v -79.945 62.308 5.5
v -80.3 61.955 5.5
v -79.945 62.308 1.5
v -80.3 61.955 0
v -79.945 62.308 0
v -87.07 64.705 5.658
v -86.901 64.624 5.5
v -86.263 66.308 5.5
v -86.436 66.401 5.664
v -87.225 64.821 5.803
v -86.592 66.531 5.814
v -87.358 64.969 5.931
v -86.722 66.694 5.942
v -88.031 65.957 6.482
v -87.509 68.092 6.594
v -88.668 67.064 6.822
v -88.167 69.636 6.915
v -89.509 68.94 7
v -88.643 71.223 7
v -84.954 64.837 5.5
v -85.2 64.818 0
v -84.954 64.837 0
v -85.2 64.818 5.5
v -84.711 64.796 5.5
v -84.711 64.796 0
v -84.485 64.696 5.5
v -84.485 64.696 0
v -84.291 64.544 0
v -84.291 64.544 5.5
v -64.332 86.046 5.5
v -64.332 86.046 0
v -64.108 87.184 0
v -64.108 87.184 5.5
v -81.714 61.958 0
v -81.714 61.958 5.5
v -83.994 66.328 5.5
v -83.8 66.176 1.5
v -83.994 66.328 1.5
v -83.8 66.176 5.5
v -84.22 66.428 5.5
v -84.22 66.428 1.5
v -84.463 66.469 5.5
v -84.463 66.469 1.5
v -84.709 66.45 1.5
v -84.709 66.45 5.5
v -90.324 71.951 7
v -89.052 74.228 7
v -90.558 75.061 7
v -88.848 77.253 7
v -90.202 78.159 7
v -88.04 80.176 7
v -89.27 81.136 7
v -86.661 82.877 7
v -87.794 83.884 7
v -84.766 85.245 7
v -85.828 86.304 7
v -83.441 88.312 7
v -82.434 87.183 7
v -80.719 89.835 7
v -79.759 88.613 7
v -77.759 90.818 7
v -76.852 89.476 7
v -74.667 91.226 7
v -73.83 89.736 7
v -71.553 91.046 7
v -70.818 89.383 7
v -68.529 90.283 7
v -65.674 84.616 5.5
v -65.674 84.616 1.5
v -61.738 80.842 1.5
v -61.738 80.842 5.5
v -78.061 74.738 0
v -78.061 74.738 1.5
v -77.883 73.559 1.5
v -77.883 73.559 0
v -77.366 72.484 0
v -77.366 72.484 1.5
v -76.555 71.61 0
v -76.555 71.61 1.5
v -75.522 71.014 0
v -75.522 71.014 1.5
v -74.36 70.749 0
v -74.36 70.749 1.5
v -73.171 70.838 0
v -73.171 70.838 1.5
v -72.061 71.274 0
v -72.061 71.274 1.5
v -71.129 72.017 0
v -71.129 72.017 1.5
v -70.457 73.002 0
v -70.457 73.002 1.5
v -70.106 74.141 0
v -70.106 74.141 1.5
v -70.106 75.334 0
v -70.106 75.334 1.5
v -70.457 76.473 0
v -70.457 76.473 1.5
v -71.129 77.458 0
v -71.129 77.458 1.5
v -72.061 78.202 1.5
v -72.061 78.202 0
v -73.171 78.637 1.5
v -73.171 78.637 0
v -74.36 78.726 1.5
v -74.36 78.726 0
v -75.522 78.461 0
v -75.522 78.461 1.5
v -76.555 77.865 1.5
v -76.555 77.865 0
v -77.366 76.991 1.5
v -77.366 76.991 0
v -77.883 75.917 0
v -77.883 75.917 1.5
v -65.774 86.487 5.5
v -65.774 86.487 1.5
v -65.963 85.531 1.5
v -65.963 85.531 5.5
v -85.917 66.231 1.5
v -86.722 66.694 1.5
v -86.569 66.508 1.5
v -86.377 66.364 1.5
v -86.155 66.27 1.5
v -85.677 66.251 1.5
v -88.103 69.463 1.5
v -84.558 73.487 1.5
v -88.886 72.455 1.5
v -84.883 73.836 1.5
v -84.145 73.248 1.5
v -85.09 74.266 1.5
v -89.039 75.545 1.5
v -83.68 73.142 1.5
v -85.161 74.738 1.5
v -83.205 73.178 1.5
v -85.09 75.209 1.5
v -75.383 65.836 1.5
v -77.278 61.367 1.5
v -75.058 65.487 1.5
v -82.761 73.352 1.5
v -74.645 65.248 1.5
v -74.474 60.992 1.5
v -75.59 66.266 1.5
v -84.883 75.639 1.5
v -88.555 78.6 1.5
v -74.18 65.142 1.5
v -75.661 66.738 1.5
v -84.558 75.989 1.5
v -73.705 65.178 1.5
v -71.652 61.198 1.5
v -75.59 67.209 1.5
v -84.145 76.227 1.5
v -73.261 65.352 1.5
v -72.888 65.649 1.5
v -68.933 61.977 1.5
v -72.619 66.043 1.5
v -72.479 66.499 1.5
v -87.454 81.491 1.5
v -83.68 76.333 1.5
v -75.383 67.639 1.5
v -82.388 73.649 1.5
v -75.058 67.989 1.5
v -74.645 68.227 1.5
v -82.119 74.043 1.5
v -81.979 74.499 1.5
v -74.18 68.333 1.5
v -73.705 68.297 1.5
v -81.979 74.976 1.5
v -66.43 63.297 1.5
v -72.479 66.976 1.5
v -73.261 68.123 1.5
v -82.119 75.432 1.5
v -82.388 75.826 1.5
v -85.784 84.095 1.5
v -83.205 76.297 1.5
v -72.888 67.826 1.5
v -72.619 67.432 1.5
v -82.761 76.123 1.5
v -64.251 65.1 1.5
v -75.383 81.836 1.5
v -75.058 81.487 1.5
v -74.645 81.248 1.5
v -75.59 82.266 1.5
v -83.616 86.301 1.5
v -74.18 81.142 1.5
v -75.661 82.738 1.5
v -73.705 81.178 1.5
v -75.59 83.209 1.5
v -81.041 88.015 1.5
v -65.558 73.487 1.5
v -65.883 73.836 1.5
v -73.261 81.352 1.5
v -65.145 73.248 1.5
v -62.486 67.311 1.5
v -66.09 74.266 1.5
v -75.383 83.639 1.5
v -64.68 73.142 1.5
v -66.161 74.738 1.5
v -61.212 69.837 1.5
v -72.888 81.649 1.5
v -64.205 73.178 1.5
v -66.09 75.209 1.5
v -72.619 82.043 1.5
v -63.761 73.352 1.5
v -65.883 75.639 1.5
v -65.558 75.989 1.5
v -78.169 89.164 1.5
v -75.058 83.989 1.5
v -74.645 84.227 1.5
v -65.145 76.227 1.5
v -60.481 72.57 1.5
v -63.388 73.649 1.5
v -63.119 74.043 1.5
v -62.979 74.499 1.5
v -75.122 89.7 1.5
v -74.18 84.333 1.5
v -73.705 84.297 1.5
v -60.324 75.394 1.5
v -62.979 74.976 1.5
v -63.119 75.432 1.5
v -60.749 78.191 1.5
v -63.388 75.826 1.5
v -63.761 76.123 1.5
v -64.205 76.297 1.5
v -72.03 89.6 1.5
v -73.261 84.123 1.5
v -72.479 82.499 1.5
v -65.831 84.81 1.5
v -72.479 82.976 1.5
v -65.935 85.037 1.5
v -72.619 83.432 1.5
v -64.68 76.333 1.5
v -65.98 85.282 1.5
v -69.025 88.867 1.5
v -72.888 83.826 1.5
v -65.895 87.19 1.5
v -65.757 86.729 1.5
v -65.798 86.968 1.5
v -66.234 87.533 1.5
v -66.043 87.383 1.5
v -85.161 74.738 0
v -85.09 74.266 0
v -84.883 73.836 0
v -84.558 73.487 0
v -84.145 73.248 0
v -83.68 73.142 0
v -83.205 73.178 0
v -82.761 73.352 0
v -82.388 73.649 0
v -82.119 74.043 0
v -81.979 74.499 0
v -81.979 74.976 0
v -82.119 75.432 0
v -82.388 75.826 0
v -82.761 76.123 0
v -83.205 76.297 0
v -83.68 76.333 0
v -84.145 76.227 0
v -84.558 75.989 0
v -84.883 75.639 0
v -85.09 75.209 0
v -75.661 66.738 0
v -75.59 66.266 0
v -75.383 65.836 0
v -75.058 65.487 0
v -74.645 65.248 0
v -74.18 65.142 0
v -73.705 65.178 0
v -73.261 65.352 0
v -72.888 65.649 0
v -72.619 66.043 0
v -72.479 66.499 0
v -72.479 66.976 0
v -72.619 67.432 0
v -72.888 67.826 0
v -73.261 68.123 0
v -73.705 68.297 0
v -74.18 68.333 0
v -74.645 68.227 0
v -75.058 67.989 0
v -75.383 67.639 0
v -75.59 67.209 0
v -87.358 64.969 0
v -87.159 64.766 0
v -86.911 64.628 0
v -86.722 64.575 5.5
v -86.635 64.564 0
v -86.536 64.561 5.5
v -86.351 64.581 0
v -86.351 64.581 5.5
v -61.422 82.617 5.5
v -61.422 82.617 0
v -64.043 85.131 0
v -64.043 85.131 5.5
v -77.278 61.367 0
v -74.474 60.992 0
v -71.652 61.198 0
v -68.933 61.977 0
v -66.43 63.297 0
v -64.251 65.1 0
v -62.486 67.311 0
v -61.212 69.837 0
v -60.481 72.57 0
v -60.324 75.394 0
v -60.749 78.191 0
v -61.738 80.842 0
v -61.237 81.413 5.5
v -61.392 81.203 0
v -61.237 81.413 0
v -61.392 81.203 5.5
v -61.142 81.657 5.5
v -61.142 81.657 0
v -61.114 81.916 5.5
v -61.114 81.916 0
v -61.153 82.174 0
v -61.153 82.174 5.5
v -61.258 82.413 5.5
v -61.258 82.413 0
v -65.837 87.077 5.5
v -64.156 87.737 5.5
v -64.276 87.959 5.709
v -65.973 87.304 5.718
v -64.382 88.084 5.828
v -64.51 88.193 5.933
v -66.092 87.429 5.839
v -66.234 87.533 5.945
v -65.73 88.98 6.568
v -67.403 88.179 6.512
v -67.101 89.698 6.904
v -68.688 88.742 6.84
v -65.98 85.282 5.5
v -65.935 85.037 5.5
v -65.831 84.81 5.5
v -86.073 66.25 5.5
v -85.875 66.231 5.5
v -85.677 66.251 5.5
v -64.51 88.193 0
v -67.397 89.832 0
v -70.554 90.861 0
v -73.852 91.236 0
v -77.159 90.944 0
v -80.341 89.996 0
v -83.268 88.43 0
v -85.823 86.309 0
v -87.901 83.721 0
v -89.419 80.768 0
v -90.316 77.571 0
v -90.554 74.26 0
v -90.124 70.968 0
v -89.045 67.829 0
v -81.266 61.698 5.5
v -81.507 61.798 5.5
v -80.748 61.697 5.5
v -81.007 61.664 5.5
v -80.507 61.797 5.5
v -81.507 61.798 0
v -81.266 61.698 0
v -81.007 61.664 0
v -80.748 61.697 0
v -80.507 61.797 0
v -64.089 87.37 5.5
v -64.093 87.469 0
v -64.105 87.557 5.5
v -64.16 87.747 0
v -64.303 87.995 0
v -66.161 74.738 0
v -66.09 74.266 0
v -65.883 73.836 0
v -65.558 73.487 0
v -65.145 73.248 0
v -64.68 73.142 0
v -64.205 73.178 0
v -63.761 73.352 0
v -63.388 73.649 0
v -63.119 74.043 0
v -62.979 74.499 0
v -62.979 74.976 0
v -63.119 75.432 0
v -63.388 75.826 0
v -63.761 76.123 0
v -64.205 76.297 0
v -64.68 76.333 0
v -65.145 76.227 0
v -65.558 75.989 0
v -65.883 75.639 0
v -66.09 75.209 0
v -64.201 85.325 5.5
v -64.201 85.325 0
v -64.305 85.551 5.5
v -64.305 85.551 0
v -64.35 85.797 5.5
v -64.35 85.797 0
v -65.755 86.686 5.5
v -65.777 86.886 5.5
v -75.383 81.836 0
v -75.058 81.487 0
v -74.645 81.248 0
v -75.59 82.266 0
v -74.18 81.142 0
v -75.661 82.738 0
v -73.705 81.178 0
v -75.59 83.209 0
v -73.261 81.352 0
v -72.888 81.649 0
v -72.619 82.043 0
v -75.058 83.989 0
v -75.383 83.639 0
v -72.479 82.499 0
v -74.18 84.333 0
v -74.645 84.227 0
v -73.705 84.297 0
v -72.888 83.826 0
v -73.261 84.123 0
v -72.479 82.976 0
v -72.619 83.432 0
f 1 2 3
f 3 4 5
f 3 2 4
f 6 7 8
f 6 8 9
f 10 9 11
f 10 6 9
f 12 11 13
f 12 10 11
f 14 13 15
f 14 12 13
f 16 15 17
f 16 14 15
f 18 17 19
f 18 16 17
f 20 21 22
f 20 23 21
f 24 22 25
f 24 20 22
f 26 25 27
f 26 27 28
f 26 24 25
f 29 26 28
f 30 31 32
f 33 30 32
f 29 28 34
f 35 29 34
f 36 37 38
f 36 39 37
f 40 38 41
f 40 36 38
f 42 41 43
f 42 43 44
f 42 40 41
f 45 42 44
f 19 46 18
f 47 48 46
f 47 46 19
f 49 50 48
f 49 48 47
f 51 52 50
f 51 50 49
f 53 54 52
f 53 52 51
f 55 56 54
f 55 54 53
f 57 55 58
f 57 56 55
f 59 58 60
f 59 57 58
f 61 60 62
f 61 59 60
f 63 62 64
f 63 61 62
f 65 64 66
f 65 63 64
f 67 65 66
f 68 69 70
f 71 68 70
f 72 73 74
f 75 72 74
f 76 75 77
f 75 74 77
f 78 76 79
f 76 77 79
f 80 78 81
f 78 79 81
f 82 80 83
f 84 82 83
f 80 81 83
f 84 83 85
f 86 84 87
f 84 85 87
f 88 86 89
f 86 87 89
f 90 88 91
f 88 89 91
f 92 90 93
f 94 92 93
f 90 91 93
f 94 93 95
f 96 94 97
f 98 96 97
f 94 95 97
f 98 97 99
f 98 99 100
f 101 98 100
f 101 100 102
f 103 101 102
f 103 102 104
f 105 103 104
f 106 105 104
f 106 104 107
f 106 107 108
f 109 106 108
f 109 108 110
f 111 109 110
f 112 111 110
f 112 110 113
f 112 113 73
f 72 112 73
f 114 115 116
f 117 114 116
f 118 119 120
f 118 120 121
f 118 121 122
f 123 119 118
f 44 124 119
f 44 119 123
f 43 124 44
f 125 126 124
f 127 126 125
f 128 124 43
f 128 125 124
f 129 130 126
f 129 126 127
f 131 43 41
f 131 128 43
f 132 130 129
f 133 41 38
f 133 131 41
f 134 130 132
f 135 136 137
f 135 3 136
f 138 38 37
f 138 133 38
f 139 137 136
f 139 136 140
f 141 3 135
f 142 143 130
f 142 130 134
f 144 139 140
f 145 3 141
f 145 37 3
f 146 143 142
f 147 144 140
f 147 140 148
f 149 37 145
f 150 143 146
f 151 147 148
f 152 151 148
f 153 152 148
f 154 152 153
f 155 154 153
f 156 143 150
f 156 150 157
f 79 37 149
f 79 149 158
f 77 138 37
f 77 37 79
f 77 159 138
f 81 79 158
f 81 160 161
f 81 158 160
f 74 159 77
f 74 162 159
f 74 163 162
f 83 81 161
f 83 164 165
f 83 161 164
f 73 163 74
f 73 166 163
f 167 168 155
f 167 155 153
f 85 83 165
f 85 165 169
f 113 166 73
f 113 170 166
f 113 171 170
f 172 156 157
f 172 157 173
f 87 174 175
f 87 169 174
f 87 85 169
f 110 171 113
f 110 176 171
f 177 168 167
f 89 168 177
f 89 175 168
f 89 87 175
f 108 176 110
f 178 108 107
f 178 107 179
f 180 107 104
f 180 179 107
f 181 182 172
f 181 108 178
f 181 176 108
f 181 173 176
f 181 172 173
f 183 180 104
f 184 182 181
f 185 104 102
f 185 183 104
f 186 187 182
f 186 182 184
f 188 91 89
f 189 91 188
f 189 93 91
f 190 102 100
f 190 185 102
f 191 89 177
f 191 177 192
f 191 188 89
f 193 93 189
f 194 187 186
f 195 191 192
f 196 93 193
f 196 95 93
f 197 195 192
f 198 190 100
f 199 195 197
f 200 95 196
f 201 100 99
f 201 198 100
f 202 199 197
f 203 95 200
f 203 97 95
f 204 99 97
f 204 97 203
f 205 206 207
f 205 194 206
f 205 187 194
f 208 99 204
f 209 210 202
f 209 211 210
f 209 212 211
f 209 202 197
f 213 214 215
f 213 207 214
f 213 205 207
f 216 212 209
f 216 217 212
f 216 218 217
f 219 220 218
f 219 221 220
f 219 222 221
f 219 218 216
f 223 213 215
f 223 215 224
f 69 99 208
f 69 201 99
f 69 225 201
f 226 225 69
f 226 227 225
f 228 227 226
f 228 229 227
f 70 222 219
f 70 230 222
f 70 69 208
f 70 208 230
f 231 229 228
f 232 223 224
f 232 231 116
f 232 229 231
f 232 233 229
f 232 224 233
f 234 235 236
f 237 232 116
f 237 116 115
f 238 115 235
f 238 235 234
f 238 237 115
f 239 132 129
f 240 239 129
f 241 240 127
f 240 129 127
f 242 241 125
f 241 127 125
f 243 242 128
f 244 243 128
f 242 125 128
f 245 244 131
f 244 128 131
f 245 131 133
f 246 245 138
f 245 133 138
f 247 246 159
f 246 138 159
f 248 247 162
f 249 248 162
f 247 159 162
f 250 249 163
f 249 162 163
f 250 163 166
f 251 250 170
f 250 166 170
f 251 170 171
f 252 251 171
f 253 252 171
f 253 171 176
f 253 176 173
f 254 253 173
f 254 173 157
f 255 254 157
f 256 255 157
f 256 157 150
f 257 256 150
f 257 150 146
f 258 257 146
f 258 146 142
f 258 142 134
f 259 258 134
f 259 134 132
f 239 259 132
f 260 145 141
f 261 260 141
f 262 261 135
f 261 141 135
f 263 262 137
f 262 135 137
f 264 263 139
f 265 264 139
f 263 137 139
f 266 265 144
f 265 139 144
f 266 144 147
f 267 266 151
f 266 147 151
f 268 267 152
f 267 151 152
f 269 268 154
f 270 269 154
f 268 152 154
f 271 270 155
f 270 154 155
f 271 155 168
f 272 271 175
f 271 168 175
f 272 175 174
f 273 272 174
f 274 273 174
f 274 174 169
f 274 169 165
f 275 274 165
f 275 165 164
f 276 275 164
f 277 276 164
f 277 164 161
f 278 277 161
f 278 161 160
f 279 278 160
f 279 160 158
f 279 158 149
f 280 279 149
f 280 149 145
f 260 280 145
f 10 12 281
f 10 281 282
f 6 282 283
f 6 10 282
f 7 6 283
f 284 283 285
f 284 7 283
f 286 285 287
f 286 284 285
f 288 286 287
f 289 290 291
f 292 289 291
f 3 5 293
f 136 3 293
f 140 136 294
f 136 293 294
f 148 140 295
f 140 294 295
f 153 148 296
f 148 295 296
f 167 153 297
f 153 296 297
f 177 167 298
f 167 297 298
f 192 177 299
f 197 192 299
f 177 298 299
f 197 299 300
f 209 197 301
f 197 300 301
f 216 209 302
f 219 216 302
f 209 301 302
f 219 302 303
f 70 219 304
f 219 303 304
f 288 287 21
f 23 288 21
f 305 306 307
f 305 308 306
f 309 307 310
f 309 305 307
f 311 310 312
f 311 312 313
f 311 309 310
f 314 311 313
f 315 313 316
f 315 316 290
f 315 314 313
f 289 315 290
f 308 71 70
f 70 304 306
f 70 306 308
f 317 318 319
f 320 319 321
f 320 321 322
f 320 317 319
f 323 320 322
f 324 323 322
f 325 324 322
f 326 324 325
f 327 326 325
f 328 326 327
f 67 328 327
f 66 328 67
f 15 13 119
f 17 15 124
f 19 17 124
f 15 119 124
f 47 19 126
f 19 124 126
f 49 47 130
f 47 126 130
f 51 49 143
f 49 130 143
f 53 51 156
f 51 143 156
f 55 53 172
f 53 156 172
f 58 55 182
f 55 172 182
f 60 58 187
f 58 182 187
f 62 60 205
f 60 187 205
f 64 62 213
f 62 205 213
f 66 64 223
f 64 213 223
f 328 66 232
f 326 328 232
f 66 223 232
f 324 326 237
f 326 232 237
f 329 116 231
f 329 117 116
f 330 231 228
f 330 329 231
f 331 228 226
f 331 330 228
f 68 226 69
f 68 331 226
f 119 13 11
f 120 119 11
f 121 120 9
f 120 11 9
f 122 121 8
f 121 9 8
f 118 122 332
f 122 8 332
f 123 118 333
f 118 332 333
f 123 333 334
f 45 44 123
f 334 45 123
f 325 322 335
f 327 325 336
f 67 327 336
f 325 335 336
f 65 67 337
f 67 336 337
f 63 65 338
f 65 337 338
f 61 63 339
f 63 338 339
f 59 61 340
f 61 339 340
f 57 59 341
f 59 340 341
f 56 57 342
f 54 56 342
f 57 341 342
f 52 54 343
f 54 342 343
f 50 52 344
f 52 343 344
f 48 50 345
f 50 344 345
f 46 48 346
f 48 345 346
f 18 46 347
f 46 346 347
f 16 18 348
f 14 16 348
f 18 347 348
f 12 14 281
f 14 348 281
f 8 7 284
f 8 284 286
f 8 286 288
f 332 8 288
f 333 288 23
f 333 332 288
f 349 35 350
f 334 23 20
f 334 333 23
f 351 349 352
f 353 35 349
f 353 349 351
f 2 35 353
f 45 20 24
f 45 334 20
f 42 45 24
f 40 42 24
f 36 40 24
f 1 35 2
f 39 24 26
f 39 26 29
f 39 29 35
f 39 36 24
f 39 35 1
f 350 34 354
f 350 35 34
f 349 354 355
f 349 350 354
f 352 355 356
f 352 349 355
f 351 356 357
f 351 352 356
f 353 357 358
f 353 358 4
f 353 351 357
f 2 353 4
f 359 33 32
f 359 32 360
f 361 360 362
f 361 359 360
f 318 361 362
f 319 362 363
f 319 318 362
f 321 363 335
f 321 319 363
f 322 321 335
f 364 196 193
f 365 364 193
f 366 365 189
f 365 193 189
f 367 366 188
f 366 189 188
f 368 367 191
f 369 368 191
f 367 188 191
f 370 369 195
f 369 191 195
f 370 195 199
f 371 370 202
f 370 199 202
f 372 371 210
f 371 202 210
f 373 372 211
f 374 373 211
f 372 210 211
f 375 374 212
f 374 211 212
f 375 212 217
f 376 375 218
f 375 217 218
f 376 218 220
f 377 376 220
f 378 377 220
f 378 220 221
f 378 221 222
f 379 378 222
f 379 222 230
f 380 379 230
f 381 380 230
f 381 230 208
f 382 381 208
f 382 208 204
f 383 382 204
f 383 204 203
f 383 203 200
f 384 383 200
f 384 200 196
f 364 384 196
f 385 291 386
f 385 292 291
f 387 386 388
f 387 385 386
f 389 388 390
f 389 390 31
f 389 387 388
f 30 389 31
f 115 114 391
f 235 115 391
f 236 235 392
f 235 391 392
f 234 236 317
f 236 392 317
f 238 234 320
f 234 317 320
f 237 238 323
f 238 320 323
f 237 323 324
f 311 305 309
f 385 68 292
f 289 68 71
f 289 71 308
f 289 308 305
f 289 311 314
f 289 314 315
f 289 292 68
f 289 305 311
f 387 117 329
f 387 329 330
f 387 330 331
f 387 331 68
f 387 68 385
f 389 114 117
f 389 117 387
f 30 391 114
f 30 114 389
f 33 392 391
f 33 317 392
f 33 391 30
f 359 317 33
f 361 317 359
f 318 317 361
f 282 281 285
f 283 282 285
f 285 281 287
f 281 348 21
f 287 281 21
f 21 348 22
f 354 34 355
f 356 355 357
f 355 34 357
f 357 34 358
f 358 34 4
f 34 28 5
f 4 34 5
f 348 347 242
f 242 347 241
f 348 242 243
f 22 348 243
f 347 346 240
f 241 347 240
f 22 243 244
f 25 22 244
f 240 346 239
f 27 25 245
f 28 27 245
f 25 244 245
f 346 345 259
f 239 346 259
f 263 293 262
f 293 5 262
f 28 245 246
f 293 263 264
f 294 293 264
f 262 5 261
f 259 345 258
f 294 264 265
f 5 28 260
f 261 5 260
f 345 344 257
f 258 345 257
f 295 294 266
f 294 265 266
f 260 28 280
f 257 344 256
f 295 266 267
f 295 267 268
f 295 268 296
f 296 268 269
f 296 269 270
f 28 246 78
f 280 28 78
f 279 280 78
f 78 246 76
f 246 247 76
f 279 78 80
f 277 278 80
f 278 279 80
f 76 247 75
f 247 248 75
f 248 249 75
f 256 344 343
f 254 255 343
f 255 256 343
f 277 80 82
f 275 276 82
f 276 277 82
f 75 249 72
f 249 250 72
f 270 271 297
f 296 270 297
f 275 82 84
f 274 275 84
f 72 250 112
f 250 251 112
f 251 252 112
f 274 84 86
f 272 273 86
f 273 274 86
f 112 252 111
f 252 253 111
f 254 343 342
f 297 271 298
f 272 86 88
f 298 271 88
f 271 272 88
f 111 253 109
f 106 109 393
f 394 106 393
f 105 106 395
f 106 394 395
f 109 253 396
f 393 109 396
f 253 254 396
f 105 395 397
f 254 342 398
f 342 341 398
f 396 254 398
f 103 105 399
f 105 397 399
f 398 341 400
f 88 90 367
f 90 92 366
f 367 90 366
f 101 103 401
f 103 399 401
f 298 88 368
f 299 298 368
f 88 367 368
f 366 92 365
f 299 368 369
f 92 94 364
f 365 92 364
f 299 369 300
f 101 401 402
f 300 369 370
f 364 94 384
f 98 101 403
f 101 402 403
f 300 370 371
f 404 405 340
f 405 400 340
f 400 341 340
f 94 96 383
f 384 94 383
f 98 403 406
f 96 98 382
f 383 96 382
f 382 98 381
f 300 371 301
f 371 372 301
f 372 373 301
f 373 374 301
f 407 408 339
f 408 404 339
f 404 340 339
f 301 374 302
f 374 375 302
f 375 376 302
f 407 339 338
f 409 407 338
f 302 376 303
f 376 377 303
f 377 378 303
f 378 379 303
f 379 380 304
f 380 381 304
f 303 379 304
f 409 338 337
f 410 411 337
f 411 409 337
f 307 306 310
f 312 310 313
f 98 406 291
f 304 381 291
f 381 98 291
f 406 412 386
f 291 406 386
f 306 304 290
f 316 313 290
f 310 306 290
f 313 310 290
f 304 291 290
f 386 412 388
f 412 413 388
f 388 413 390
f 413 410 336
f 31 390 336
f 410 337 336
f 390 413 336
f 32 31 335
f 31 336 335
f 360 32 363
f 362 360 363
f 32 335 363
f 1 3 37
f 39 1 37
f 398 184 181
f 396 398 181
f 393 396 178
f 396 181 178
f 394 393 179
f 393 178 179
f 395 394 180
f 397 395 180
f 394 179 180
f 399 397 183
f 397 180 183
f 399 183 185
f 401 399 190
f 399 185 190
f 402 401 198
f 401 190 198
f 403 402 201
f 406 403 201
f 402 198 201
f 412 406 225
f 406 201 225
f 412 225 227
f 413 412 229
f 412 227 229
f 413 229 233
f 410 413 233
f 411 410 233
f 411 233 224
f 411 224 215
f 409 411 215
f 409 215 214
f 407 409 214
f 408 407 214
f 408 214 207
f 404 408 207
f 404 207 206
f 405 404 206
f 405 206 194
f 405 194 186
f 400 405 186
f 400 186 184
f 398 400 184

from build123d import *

# Parameters (mm, degrees)
F1_DEPTH    = 1.5
F2_DEPTH    = 5.5
F3_DEPTH    = 7
F4_T1_DEPTH = 21.6191756982
F4_T3_DEPTH = 21.6239840214
F5_R        = 1
F6_D        = 3.2
F6_DEPTH    = 4
F6_TIP      = 0.9613769904
F7_D        = 8
F7_DEPTH    = 4
F7_TIP      = 2.4034424761


# Not quite as in the source:
# - a fillet or chamfer that OpenCascade refuses, or shapes differently, is made with other operations: its cross-section is extruded or revolved along the edge and cut away or added


with BuildPart() as f1:
    # F0 (on Top) → F1 (new body)
    with BuildSketch(Plane.XY):
        with BuildLine():
            Line((-66.0687833834, 84.994474126), (-65.6429035596, 87.1528592574))
            ThreePointArc((-65.6429035596, 87.1528592574), (-84.7546054832, 85.2563072371), (-86.3354477268, 66.1159050004))
            Line((-86.3354477268, 66.1159050004), (-84.1804171789, 66.558446905))
            Line((-84.1804171789, 66.558446905), (-79.945453805, 62.3081427722))
            ThreePointArc((-79.945453805, 62.3081427722), (-64.2506598446, 65.1001279098), (-61.7378264361, 80.8420276277))
            Line((-61.7378264361, 80.8420276277), (-66.0687833834, 84.994474126))
        make_face()
    extrude(amount=F1_DEPTH)

    # F0 (on Top) → F2 (join)
    with BuildSketch(Plane.XY):
        Polygon((-84.1804171789, 66.558446905), (-86.3354477268, 66.1159050004), (-86.9652344199, 64.4552756389), (-84.6716307932, 64.9262739357), (-81.0080298382, 61.2494019287), (-79.945453805, 62.3081427722), align=None)
        Polygon((-63.9854566278, 87.8042374119), (-65.6429035596, 87.1528592574), (-66.0687833834, 84.994474126), (-61.7378264361, 80.8420276277), (-60.6997148116, 81.9247668645), (-64.4382903395, 85.5092483194), align=None)
    extrude(amount=F2_DEPTH)

    # F0 (on Top) → F3 (join)
    with BuildSketch(Plane.XY):
        with BuildLine():
            ThreePointArc((-86.3354477268, 66.1159050004), (-84.7546054832, 85.2563072371), (-65.6429035596, 87.1528592574))
            Line((-65.6429035596, 87.1528592574), (-63.9854566278, 87.8042374119))
            ThreePointArc((-63.9854566278, 87.8042374119), (-85.82068996, 86.3115247186), (-86.9652344199, 64.4552756389))
            Line((-86.9652344199, 64.4552756389), (-86.3354477268, 66.1159050004))
        make_face()
    extrude(amount=F3_DEPTH)

    # F4: fillet of radius 6 on 2 edges, made by hand

    # F4_s2 → F4_t1 (cut)
    with BuildSketch(Plane(origin=(6.9172981305, 18.2396174816, 0), x_dir=(0, 0, 1), z_dir=(0.3546014652, 0.9350175404, 0))):
        with BuildLine():
            ThreePointArc((5.5, -104.169954771), (6.6124860802, -106.0172613941), (7, -108.1385817376))
            Line((7, -108.1385817376), (7, -104.169954771))
            Line((7, -104.169954771), (5.5, -104.169954771))
        make_face()
    extrude(amount=F4_T1_DEPTH, mode=Mode.SUBTRACT)

    # F4_s4 → F4_t3 (cut)
    with BuildSketch(Plane(origin=(-36.4260217608, -14.315459745, 0), x_dir=(0, 0, 1), z_dir=(0.9307059478, 0.3657682856, 0))):
        with BuildLine():
            ThreePointArc((5.5, -105.123776774), (6.6124860802, -106.971083397), (7, -109.0924037406))
            Line((7, -109.0924037406), (7, -105.123776774))
            Line((7, -105.123776774), (5.5, -105.123776774))
        make_face()
    extrude(amount=F4_T3_DEPTH, mode=Mode.SUBTRACT)

    # F5 (call 1 of 10: OpenCascade refuses the feature's edges together)
    f5_edges = [f1.edges().sort_by_distance(p)[0] for p in [
        (-86.965234, 64.455276, 2.75),
    ]]
    fillet(f5_edges, radius=F5_R)

    # F5#2 (call 2 of 10)
    f5_2_edges = [f1.edges().sort_by_distance(p)[0] for p in [
        (-84.671631, 64.926274, 2.75),
    ]]
    fillet(f5_2_edges, radius=F5_R)

    # F5#3 (call 3 of 10)
    f5_3_edges = [f1.edges().sort_by_distance(p)[0] for p in [
        (-81.00803, 61.249402, 2.75),
    ]]
    fillet(f5_3_edges, radius=F5_R)

    # F5#4 (call 4 of 10)
    f5_4_edges = [f1.edges().sort_by_distance(p)[0] for p in [
        (-60.699715, 81.924767, 2.75),
    ]]
    fillet(f5_4_edges, radius=F5_R)

    # F5#5 (call 5 of 10)
    f5_5_edges = [f1.edges().sort_by_distance(p)[0] for p in [
        (-64.43829, 85.509248, 2.75),
    ]]
    fillet(f5_5_edges, radius=F5_R)

    # F5#6 (call 6 of 10)
    f5_6_edges = [f1.edges().sort_by_distance(p)[0] for p in [
        (-63.985457, 87.804237, 2.75),
    ]]
    fillet(f5_6_edges, radius=F5_R)

    # F5#7 (call 7 of 10)
    f5_7_edges = [f1.edges().sort_by_distance(p)[0] for p in [
        (-84.180417, 66.558447, 3.5),
    ]]
    fillet(f5_7_edges, radius=F5_R)

    # F5#8 (call 8 of 10)
    f5_8_edges = [f1.edges().sort_by_distance(p)[0] for p in [
        (-66.068783, 84.994474, 3.5),
    ]]
    fillet(f5_8_edges, radius=F5_R)

    # F5#9 (call 9 of 10)
    f5_9_edges = [f1.edges().sort_by_distance(p)[0] for p in [
        (-65.642904, 87.152859, 3.5),
    ]]
    fillet(f5_9_edges, radius=F5_R)

    # F5#10 (call 10 of 10)
    f5_10_edges = [f1.edges().sort_by_distance(p)[0] for p in [
        (-86.335448, 66.115905, 3.5),
    ]]
    fillet(f5_10_edges, radius=F5_R)

    # F6
    with Locations(Plane(origin=(0, 0, 0), x_dir=(1, 0, 0), z_dir=(0, 0, -1))):
        with Locations((-83.5608274937, -74.7376042604), (-74.0608274937, -82.7376042604), (-64.5608274937, -74.7376042604), (-74.0608274937, -66.7376042604)):
            Hole(F6_D / 2, depth=F6_DEPTH)
            with Locations((0, 0, -(F6_DEPTH + F6_TIP / 2))):  # 118° drill point
                Cone(0, F6_D / 2, F6_TIP, mode=Mode.SUBTRACT)

    # F7
    with Locations(Plane(origin=(0, 0, 0), x_dir=(1, 0, 0), z_dir=(0, 0, -1))):
        with Locations((-74.0608274937, -74.7376042604)):
            Hole(F7_D / 2, depth=F7_DEPTH)
            with Locations((0, 0, -(F7_DEPTH + F7_TIP / 2))):  # 118° drill point
                Cone(0, F7_D / 2, F7_TIP, mode=Mode.SUBTRACT)


solid = f1.part
